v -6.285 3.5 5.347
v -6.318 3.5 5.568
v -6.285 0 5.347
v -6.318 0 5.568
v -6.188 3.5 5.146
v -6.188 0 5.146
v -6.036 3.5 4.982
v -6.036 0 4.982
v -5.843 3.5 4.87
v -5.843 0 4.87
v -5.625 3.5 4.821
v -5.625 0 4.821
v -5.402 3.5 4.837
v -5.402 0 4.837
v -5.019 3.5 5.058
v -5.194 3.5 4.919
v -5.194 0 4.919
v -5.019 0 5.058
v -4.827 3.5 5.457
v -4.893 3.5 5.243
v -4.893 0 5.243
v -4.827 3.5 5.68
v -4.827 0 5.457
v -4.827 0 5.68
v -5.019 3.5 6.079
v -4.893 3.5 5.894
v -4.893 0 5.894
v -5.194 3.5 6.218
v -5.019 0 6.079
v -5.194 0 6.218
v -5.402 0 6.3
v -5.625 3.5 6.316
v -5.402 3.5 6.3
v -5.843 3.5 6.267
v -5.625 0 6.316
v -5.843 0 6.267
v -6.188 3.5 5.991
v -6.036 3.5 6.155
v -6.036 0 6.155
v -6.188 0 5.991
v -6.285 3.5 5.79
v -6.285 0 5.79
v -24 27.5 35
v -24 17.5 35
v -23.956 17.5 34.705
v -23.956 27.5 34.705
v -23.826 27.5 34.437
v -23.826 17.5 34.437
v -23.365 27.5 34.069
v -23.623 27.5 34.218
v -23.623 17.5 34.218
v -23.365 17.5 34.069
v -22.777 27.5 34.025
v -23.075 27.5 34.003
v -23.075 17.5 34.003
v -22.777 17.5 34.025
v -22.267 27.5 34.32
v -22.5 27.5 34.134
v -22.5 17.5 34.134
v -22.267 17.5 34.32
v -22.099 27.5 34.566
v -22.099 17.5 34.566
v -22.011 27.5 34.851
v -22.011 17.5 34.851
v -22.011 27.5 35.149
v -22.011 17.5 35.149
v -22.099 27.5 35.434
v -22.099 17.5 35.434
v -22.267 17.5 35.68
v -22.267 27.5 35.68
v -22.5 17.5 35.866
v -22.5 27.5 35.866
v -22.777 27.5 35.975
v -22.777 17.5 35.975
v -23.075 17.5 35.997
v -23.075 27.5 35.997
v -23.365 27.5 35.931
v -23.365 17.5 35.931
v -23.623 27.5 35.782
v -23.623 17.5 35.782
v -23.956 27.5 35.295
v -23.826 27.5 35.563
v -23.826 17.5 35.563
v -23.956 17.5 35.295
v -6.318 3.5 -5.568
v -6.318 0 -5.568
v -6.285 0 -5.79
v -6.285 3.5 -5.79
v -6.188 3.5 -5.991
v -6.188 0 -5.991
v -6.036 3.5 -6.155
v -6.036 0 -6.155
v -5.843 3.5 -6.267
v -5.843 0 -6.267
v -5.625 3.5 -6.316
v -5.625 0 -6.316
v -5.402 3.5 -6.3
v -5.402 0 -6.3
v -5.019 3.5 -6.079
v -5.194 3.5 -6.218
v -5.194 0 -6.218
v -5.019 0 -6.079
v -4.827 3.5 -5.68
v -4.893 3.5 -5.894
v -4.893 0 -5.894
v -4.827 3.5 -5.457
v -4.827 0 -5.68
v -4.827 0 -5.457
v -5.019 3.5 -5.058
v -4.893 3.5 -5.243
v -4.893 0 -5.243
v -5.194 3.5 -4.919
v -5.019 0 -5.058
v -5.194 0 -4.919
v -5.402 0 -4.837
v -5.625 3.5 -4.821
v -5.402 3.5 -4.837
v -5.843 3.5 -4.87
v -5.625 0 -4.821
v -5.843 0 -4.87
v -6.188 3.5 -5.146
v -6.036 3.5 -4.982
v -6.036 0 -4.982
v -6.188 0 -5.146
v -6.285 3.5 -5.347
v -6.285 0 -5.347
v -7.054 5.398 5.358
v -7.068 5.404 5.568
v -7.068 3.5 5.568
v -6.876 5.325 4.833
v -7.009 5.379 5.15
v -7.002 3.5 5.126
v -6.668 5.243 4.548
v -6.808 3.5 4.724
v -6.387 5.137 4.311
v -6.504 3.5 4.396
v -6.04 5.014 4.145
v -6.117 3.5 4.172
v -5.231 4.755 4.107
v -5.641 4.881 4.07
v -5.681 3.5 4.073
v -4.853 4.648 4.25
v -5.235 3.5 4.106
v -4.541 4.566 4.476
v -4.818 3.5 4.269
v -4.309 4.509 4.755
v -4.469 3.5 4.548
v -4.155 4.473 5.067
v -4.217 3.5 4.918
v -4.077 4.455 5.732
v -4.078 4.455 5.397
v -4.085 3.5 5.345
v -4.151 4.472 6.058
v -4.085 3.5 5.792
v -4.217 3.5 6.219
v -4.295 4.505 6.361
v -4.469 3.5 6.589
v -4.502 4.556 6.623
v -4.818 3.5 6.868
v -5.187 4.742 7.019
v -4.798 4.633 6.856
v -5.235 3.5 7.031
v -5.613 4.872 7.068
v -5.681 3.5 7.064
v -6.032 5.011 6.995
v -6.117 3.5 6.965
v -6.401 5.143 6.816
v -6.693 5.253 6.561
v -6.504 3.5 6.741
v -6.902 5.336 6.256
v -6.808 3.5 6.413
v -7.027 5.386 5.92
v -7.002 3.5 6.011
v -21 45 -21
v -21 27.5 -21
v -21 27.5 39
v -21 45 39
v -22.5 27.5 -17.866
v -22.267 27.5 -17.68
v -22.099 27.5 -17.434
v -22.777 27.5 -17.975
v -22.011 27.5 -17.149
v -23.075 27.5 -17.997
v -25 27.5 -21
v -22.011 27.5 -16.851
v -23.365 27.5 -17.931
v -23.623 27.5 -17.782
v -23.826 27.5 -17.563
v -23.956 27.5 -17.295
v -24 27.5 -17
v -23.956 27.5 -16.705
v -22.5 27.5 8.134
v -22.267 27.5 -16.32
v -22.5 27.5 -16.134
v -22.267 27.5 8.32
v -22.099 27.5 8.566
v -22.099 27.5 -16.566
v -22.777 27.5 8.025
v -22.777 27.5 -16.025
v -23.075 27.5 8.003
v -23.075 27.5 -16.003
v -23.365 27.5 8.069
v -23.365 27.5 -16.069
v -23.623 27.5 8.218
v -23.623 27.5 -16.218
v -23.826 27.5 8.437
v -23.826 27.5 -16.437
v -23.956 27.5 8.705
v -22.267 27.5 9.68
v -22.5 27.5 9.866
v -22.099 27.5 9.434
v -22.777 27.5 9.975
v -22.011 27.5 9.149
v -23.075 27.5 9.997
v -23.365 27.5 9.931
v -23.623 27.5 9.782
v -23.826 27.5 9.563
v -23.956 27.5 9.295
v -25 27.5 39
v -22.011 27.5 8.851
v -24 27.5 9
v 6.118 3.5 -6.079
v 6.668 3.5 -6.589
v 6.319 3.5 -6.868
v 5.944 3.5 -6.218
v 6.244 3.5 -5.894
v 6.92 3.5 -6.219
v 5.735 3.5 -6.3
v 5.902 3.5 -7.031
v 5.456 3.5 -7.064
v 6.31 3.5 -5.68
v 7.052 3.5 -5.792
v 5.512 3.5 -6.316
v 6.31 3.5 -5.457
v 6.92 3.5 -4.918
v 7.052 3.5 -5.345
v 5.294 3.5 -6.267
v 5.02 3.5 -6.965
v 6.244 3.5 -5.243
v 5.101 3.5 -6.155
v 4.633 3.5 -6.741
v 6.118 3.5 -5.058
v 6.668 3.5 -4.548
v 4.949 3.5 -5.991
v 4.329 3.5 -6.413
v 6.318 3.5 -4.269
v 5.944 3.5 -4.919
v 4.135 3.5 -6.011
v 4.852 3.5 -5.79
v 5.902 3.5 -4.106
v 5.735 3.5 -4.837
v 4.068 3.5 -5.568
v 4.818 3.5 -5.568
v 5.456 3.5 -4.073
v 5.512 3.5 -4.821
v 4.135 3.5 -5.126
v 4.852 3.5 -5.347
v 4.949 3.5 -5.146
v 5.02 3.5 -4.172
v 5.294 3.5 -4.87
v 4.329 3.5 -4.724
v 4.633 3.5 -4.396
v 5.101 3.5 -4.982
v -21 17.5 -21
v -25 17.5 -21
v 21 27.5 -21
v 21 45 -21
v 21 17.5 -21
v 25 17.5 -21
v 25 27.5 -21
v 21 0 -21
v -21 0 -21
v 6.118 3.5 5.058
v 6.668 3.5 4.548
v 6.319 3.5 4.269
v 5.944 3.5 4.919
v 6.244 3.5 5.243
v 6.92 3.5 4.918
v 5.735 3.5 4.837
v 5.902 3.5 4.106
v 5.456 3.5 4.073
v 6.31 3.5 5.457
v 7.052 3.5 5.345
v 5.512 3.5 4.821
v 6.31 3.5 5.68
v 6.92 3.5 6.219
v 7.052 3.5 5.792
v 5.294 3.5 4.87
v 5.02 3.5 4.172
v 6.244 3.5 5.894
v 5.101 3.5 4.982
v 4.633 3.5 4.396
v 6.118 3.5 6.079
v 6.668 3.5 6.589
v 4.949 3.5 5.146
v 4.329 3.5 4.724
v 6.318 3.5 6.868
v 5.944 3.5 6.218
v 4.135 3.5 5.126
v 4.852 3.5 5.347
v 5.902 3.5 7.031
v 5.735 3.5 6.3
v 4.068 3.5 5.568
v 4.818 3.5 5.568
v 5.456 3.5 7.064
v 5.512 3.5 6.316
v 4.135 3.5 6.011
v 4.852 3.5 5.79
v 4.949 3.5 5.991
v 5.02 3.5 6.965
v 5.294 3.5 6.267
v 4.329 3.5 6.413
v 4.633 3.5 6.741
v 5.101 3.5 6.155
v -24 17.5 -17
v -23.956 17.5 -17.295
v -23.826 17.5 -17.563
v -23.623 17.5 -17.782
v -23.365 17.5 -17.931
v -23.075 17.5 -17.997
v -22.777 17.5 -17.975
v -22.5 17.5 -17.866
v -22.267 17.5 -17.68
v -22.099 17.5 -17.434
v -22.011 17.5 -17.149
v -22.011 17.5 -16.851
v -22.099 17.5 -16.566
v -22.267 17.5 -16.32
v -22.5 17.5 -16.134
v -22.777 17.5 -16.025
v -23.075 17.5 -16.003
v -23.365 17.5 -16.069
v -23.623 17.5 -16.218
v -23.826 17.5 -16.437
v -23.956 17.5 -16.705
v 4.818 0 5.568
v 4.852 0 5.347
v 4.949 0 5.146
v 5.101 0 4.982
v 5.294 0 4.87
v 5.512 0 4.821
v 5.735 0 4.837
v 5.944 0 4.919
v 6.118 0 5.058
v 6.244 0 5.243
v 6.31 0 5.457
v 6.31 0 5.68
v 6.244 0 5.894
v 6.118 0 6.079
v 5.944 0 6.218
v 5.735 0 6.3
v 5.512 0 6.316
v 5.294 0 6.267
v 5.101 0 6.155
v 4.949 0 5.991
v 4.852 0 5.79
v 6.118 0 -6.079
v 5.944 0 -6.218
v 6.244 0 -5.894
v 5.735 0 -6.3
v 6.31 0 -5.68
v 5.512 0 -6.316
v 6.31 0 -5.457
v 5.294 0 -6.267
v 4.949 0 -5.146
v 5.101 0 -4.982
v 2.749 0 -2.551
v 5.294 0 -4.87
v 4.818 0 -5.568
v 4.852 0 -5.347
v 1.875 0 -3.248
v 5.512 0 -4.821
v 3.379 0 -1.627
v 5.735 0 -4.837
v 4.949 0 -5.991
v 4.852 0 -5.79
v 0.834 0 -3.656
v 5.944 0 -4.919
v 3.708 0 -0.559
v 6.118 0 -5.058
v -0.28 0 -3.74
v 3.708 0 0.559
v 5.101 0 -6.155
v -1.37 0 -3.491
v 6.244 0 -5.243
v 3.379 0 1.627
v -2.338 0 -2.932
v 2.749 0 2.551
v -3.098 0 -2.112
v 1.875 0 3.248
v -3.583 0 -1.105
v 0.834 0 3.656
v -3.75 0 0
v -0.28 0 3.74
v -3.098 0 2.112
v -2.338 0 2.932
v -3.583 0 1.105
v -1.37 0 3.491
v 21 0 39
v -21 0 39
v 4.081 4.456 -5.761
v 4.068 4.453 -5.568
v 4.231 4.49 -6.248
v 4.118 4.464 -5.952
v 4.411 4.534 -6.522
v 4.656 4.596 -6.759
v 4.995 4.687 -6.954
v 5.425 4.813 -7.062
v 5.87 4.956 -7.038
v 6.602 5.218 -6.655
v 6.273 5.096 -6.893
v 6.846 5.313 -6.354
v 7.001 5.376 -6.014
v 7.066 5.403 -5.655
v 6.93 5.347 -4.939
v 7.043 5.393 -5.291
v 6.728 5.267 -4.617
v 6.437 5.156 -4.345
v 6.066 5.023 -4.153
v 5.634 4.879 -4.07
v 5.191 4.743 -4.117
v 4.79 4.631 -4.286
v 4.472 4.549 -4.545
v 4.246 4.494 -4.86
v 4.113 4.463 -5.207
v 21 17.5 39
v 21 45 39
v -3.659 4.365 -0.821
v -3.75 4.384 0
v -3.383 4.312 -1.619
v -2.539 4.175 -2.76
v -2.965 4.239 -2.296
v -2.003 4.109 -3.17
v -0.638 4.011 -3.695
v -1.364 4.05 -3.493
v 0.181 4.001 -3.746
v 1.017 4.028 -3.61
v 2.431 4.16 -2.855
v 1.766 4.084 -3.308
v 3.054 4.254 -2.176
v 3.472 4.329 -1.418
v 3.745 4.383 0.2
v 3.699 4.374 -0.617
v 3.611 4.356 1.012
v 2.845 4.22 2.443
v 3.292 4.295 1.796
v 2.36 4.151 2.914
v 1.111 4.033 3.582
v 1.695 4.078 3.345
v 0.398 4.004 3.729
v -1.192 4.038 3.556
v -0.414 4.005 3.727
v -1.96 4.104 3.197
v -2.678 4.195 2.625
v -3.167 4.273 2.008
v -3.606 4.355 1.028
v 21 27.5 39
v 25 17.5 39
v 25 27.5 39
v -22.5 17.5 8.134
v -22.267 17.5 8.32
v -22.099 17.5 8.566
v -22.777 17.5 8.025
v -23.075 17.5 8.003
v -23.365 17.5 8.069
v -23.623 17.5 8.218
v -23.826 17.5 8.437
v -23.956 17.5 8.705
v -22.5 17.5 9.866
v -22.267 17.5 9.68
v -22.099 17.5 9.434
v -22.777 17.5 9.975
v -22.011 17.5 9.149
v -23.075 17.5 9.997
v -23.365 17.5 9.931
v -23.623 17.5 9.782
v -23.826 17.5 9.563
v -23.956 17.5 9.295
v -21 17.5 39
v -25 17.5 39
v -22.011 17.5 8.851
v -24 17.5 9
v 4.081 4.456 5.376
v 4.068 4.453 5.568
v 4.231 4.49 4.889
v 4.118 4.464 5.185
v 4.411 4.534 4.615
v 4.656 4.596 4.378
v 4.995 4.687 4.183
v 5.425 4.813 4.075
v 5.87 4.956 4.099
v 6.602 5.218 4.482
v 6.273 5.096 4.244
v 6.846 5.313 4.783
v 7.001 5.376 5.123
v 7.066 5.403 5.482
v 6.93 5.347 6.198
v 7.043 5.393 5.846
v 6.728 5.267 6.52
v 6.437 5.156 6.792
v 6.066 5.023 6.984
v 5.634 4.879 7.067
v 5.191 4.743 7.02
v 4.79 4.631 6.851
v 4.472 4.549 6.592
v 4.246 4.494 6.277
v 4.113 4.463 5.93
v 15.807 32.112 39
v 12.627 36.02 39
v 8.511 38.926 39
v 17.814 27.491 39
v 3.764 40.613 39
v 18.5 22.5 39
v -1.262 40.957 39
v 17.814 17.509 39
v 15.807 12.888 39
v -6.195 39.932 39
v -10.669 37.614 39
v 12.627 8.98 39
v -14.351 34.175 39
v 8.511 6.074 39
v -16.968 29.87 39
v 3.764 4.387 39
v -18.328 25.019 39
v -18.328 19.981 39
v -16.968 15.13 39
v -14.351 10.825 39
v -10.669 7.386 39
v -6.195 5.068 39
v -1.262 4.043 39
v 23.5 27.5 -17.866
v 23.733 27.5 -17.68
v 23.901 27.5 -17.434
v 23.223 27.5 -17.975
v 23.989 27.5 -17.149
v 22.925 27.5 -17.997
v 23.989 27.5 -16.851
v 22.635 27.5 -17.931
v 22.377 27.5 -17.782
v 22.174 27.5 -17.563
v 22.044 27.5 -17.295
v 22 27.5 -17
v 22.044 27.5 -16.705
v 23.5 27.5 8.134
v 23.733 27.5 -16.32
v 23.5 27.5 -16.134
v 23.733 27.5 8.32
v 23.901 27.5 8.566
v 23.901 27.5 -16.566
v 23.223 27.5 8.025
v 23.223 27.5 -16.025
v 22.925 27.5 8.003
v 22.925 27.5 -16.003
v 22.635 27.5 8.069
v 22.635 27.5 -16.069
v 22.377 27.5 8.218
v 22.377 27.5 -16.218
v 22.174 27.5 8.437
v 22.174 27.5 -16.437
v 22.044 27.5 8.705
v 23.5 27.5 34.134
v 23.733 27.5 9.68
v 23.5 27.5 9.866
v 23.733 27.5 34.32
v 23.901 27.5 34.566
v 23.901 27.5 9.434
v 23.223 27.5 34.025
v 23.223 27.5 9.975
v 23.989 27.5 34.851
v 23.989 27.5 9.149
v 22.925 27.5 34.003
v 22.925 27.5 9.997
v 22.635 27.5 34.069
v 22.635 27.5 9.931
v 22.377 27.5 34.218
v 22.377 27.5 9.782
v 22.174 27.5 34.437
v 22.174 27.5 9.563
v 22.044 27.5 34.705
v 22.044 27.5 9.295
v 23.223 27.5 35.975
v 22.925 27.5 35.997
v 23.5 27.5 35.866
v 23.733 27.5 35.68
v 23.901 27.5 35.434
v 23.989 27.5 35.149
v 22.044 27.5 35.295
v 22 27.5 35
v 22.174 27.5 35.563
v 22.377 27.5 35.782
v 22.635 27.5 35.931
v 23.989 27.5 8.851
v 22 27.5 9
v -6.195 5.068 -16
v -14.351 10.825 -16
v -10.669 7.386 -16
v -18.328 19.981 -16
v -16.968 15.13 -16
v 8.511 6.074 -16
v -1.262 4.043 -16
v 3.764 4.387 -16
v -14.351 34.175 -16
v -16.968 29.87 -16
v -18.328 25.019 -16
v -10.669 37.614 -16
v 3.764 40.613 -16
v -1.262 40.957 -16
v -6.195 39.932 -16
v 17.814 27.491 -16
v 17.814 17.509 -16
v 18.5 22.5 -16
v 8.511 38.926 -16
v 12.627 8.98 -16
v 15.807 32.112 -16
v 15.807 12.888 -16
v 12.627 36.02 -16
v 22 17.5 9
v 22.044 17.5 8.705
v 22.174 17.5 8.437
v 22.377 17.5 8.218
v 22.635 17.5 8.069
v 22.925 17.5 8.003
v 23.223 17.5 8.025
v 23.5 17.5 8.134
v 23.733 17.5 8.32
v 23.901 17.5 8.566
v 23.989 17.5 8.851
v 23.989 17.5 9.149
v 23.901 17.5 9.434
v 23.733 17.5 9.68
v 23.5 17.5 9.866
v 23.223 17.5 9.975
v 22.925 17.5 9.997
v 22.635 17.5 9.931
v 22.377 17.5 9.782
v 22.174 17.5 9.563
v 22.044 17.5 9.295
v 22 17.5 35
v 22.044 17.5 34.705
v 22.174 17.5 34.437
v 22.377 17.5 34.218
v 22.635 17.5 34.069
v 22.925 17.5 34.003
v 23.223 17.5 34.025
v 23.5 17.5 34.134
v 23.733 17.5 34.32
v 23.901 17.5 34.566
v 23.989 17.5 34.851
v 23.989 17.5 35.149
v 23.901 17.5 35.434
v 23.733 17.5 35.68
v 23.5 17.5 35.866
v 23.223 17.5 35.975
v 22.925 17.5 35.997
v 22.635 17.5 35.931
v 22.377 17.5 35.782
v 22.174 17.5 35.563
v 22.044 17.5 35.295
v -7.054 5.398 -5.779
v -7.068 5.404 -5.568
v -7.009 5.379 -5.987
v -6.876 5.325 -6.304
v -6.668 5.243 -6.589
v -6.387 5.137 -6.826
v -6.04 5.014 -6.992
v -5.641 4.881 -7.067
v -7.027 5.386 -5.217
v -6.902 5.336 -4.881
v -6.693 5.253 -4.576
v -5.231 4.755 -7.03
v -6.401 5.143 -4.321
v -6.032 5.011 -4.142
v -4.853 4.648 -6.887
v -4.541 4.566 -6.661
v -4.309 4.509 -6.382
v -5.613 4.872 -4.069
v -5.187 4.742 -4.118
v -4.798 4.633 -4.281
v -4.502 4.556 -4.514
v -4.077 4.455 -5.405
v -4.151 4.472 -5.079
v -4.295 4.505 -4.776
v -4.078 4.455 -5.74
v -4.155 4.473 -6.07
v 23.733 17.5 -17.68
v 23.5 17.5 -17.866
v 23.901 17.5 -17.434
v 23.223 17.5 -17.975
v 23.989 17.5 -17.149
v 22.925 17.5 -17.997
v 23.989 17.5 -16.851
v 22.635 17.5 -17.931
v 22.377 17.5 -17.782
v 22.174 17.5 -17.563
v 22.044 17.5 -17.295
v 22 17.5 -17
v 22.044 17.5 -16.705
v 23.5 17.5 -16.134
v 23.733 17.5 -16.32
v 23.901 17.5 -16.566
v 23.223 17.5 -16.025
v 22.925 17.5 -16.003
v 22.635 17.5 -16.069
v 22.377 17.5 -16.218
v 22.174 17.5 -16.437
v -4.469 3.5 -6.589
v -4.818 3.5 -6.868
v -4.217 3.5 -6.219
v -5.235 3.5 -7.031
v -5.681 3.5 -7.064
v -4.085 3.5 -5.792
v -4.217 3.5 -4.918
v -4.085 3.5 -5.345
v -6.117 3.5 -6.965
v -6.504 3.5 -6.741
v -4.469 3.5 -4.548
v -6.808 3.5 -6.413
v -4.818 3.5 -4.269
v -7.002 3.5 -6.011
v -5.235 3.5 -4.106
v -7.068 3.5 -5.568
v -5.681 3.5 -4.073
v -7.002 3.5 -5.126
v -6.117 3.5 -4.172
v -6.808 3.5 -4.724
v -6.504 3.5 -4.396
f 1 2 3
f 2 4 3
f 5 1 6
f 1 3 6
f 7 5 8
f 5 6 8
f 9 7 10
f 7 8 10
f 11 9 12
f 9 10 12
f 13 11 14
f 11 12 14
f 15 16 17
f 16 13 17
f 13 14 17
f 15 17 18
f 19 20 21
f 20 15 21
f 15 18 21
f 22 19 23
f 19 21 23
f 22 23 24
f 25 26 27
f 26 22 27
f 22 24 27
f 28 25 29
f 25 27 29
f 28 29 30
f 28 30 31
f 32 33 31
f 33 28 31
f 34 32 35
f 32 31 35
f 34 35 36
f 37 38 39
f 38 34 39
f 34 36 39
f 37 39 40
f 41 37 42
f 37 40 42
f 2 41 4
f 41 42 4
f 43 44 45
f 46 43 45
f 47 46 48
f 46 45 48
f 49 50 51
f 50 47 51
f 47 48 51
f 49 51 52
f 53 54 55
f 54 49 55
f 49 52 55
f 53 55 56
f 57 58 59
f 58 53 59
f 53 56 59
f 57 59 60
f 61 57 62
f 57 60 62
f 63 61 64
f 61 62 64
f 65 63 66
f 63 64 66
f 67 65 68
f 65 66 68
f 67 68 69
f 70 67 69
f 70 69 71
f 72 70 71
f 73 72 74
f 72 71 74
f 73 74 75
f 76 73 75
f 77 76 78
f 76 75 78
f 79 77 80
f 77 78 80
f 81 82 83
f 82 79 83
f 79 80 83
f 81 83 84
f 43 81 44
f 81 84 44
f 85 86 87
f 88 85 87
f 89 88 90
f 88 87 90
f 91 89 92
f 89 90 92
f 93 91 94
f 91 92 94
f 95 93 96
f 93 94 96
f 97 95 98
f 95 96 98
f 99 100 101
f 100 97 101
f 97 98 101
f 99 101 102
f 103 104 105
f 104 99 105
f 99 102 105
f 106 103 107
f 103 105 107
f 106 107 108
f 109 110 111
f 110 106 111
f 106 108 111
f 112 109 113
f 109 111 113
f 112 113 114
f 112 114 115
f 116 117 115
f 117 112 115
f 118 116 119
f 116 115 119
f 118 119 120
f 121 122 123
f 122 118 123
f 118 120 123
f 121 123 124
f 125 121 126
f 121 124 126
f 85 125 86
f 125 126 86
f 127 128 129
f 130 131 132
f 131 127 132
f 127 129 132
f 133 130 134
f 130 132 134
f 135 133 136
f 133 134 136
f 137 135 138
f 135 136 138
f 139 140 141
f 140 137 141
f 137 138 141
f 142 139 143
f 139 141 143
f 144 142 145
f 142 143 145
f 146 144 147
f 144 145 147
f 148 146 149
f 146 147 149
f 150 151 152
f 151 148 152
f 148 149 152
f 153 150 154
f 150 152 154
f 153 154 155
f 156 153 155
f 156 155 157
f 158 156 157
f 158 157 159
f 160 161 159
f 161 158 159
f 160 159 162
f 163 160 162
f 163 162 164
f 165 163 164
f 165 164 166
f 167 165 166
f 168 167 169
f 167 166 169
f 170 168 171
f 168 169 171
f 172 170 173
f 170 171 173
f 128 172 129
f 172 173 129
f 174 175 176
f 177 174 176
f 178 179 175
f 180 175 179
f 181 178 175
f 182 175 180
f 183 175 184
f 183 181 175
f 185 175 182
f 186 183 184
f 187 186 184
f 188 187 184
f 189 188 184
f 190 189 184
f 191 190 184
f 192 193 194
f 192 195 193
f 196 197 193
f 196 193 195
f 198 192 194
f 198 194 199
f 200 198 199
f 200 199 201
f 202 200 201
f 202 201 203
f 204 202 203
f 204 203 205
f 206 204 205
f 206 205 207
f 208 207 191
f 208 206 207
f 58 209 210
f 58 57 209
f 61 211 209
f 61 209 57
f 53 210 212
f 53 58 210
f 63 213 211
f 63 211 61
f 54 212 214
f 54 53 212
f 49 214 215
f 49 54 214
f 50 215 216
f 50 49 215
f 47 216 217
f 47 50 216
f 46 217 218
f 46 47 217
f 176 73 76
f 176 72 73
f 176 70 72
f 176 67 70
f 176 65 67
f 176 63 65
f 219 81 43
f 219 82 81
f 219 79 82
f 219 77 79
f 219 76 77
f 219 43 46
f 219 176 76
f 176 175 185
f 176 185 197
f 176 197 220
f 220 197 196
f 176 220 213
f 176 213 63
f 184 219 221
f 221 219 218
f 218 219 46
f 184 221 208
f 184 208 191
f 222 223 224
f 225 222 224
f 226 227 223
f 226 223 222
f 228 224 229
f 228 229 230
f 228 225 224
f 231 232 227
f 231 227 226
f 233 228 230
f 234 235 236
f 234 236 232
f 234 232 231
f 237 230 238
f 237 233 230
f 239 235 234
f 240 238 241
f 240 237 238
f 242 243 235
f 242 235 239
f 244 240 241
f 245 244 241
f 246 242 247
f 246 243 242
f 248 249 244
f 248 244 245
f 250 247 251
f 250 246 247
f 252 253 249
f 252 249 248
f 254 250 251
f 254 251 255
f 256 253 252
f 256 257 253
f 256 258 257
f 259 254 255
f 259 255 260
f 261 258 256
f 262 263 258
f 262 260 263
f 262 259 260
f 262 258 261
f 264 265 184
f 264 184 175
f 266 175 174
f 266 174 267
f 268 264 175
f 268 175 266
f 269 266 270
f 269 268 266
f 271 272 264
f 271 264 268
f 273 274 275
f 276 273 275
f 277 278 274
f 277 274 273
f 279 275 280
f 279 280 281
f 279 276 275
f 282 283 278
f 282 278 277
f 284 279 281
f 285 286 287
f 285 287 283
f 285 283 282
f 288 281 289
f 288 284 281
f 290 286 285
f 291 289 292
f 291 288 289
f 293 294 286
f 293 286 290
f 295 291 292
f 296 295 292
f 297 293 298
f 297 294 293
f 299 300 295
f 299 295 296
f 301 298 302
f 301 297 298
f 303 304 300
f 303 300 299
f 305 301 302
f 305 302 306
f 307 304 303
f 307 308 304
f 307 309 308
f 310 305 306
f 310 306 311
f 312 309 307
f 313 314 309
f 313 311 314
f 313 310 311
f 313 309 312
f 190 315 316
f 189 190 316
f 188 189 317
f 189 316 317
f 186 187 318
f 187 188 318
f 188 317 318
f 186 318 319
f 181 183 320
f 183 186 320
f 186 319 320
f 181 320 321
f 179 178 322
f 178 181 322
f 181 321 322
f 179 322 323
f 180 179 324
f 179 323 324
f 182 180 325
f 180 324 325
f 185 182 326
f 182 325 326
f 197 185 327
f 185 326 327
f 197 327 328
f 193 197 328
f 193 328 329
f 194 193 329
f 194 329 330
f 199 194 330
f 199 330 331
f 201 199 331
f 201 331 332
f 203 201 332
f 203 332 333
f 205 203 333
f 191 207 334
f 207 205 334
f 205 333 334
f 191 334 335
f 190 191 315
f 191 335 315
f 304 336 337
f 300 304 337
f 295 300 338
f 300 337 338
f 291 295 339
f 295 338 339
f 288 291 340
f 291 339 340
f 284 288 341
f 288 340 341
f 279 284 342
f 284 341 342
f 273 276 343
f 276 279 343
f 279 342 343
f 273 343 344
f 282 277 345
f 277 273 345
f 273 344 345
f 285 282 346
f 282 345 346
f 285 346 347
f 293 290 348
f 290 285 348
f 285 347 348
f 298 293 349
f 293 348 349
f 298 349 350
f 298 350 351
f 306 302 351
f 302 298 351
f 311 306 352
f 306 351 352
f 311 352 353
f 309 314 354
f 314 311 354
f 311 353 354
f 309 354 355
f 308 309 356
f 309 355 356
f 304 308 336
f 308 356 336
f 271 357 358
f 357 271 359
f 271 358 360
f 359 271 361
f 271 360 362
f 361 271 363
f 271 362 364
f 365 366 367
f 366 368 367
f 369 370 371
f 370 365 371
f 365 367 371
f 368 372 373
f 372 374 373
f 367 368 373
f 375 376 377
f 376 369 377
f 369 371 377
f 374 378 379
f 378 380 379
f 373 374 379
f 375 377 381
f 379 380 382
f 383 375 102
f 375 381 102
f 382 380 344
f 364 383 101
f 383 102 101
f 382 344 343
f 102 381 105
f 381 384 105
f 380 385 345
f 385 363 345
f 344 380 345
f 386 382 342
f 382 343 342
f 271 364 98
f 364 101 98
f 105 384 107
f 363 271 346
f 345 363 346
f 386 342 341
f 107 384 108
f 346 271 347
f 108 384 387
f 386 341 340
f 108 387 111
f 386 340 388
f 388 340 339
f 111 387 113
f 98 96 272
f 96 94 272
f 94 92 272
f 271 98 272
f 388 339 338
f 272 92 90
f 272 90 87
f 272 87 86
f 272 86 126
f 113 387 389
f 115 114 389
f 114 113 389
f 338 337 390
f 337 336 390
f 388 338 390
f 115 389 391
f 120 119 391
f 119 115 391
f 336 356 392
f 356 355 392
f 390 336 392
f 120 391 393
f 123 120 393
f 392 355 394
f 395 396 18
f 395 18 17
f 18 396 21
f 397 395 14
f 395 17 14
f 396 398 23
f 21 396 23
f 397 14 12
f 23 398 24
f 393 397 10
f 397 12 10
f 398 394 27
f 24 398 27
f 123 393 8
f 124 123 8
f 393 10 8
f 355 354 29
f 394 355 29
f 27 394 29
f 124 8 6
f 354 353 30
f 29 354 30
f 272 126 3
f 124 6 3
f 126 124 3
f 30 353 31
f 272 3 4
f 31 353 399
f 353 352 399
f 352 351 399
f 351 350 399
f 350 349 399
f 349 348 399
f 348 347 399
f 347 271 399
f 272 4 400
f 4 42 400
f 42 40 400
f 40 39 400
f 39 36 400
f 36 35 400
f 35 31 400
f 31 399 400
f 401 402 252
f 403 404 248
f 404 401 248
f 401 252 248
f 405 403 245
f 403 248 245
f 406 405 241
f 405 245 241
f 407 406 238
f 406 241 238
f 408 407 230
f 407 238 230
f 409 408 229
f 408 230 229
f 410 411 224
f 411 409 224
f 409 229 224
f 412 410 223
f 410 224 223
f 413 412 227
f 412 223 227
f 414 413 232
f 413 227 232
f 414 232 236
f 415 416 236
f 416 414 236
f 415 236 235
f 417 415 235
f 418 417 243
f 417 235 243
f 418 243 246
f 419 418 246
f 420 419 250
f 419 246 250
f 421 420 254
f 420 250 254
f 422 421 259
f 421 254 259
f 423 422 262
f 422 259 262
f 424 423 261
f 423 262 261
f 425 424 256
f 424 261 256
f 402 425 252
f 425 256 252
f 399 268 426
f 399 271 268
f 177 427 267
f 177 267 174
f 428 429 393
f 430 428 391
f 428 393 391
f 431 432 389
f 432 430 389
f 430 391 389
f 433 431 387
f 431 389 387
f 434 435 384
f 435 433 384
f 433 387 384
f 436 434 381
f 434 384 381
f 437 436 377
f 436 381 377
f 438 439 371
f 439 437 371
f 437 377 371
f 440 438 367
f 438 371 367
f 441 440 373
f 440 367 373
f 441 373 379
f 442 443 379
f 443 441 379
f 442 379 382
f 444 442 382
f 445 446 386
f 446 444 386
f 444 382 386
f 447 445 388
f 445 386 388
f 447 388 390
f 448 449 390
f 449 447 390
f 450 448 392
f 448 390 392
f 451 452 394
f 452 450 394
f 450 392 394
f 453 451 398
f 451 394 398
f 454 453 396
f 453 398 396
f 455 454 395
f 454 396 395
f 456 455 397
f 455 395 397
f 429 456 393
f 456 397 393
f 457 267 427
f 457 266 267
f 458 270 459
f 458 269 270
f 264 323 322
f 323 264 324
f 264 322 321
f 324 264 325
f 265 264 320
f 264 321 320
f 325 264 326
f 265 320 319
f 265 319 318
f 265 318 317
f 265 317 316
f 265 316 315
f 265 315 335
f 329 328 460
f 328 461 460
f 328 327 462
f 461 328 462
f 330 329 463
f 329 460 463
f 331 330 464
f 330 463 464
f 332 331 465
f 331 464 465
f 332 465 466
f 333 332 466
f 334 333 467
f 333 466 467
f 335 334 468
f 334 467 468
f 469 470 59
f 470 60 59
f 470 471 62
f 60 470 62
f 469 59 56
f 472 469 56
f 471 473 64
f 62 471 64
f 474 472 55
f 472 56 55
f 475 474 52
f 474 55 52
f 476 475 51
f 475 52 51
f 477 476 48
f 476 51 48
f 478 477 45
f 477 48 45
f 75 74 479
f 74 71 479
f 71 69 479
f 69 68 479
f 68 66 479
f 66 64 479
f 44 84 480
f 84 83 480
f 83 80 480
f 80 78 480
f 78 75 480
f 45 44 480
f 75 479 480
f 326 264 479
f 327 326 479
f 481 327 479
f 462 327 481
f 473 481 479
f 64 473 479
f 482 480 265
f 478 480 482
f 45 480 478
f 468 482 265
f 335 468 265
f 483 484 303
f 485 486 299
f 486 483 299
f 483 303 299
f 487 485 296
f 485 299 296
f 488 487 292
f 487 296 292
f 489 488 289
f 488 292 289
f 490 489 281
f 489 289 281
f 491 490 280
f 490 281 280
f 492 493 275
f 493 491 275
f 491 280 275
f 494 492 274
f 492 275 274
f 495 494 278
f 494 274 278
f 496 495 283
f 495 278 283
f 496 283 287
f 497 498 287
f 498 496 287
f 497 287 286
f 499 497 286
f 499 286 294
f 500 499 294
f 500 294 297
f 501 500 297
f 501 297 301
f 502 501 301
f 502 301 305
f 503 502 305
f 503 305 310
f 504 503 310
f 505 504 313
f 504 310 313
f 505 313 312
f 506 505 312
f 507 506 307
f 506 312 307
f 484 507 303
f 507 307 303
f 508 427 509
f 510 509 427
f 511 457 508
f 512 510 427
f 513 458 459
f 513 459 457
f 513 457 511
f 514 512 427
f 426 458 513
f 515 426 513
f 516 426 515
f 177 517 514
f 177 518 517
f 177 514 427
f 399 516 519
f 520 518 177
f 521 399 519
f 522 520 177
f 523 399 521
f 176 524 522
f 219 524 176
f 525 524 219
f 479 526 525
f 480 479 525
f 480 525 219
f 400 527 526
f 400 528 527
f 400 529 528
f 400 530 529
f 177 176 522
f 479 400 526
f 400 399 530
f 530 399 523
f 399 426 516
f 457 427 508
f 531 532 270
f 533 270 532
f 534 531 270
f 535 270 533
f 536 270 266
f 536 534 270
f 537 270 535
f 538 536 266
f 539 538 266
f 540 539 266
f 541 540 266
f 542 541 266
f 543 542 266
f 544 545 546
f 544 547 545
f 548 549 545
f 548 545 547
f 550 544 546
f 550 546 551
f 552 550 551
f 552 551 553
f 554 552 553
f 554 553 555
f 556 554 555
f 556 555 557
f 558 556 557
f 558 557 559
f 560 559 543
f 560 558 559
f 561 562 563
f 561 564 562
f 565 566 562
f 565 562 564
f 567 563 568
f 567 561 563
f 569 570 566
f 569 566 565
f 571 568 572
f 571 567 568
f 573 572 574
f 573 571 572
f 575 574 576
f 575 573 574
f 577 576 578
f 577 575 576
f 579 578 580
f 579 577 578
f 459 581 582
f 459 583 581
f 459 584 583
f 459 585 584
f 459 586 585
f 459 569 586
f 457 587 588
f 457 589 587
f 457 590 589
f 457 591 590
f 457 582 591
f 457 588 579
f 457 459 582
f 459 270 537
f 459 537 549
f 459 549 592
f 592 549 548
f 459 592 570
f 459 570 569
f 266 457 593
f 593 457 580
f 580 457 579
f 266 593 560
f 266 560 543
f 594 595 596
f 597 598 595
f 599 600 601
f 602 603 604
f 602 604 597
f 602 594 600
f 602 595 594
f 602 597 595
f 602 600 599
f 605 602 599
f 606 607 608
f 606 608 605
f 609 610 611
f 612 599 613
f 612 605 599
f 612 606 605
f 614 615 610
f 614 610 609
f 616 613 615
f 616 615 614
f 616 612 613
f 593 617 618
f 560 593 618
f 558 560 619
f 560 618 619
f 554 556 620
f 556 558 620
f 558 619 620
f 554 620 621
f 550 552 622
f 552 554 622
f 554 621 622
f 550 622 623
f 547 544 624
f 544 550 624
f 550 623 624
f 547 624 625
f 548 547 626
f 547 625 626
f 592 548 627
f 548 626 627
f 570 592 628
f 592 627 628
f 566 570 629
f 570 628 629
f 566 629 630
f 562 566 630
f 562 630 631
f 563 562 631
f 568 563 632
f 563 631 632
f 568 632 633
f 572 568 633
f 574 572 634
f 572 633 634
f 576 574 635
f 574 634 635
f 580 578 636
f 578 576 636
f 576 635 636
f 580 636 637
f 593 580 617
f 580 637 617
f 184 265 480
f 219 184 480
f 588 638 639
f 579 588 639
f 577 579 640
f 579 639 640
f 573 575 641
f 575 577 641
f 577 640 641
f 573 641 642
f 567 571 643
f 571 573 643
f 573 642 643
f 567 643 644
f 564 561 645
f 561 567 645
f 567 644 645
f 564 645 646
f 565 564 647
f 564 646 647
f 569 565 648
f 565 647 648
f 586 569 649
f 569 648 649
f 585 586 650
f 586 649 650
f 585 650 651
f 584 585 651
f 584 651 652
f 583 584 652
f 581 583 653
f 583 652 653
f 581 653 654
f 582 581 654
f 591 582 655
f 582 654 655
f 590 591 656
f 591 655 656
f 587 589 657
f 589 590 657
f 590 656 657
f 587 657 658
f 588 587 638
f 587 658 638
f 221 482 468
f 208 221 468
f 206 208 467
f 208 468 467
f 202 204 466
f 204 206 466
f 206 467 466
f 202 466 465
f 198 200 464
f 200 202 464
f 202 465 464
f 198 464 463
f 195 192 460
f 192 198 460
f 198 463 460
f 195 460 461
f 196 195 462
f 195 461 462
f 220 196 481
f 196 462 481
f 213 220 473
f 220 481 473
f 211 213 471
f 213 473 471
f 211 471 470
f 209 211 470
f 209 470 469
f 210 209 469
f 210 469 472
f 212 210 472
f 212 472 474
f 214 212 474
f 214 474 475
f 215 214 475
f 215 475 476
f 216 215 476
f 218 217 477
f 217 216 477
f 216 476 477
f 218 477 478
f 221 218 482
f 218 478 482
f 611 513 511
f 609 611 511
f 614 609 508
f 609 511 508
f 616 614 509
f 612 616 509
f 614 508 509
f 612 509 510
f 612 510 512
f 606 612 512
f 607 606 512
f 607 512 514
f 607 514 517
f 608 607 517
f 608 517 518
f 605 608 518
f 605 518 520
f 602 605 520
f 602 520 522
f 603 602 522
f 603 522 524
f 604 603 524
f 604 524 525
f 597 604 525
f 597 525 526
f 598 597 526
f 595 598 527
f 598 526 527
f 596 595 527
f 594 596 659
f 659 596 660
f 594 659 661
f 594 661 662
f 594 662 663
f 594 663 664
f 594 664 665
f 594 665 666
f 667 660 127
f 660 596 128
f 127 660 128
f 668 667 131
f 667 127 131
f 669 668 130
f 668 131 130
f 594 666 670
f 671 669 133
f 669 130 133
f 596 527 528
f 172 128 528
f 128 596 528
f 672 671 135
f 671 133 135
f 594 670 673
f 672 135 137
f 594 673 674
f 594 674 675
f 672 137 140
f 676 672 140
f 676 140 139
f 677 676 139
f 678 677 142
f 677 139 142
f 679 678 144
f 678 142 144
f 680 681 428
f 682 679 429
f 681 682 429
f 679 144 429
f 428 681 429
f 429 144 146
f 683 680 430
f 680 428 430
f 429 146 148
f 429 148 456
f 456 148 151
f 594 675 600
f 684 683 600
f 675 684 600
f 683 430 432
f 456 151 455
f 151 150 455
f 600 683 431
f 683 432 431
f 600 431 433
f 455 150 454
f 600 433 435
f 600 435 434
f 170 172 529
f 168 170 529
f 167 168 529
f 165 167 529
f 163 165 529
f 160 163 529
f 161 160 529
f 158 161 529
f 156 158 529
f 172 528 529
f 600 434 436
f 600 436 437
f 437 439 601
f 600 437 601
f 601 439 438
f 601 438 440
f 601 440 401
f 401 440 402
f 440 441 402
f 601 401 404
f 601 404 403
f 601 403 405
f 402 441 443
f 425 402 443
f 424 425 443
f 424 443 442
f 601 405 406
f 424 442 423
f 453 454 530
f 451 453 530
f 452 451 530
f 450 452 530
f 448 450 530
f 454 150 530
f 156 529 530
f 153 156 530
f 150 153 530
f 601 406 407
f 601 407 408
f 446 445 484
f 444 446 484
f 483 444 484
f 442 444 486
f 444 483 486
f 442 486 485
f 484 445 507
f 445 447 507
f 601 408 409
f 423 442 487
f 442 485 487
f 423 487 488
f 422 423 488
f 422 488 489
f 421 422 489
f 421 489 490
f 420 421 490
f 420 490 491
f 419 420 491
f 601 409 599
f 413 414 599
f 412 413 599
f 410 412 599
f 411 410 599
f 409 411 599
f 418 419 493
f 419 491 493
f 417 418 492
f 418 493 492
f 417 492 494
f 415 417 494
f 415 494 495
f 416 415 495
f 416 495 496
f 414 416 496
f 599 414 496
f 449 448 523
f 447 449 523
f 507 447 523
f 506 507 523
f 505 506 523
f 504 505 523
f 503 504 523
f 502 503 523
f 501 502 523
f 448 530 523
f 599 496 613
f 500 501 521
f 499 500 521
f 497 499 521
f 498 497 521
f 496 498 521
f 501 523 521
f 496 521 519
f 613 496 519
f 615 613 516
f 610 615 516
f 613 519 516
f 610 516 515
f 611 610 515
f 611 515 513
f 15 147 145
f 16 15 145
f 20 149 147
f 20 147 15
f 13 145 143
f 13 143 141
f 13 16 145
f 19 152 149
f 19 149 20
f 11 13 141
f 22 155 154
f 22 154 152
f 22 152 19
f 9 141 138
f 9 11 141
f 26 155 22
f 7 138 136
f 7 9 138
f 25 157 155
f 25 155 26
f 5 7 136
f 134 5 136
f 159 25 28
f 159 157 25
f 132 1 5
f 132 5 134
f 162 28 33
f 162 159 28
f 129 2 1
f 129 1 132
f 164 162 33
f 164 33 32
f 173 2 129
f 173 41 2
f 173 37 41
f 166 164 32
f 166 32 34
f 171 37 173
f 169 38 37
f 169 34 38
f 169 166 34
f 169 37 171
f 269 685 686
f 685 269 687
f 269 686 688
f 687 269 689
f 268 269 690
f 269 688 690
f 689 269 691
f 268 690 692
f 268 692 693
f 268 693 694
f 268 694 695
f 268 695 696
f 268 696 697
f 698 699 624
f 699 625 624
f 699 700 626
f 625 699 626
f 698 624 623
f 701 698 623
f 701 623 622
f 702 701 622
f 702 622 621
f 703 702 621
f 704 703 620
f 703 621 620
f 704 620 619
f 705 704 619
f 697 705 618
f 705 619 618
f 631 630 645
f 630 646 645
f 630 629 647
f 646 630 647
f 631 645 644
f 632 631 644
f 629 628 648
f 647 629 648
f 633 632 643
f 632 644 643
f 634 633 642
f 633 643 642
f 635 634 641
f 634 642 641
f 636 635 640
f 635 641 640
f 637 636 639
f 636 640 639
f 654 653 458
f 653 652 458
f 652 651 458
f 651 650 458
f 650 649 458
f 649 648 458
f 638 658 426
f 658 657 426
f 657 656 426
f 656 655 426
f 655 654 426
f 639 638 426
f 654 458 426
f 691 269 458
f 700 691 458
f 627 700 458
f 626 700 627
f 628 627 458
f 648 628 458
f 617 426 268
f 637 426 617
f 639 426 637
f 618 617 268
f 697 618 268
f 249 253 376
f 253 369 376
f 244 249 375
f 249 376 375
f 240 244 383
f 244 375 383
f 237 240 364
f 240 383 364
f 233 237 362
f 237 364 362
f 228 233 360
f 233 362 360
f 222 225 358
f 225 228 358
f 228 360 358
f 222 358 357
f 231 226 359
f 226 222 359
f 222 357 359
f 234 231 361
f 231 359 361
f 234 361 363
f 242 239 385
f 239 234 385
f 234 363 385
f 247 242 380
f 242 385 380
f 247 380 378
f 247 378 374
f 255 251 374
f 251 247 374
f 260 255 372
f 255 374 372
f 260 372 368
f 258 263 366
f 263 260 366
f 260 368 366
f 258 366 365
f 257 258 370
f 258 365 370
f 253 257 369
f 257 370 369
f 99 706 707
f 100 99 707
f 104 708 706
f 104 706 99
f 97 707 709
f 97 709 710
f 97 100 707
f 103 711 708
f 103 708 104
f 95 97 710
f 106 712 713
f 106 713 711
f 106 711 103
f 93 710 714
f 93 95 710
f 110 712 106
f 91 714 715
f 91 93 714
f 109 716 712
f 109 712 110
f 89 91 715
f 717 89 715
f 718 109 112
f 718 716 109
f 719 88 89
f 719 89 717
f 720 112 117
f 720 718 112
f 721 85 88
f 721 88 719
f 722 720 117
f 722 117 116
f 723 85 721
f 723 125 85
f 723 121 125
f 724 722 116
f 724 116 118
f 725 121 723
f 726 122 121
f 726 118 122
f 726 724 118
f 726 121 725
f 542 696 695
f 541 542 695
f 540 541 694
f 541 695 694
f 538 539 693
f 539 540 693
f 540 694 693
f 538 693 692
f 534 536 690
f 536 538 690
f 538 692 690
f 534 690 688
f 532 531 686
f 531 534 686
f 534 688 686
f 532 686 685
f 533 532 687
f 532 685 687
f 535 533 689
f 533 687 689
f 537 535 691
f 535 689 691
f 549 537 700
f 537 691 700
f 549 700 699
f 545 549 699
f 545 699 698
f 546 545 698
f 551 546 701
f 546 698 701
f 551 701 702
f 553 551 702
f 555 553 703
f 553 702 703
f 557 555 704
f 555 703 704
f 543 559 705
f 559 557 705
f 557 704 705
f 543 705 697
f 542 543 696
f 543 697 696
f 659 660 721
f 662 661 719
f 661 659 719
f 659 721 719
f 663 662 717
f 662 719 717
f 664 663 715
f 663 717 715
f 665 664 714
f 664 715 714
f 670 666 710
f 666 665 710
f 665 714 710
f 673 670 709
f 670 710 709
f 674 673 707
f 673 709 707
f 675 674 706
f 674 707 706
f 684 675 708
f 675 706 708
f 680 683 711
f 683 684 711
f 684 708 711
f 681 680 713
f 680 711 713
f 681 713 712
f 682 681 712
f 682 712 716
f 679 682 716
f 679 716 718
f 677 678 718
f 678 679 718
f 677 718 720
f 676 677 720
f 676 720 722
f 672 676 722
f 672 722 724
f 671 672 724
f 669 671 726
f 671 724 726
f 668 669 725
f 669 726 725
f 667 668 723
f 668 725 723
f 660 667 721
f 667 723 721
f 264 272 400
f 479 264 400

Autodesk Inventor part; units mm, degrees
ref_plane "YZ Plane" through (0, 0, 0) normal (1, 0, 0) x (0, 1, 0)
ref_plane "XZ Plane" through (0, 0, 0) normal (0, 1, 0) x (-1, 0, 0)
ref_plane "XY Plane" through (0, 0, 0) normal (0, 0, 1) x (1, 0, 0)
sketch "Sketch1" plane through (0, 0, 0) normal (0, 1, 0) x (-1, 0, 0)
  circle A0 centre (0, 0) radius 11 construction
  circle A1 centre (0, 0) radius 3.75
  circle A2 centre (0, 0) radius 7.875 construction
  line L0 (16.292, 0) -> (-19, 0) construction
  line L1 (0, 21) -> (0, -27.3544) construction
  line L2 (0, -21) -> (21, -21)
  line L3 (0, -21) -> (-21, -21)
  line L4 (0, 0) -> (21, -21) construction
  circle A3 centre (5.5685, -5.5685) radius 0.75
  circle A4 centre (-5.5685, -5.5685) radius 0.75
  circle A5 centre (5.5685, 5.5685) radius 0.75
  circle A6 centre (-5.5685, 5.5685) radius 0.75
  line L5 (-25, -21) -> (-21, -21)
  line L6 (25, -21) -> (21, -21)
  circle A7 centre (23, -17) radius 1
  circle A8 centre (-23, -17) radius 1
  line L7 (-25, 39) -> (25, 39)
  line L8 (25, -21) -> (25, 39)
  line L9 (21, -21) -> (21, 39)
  line L10 (-21, -21) -> (-21, 39)
  line L11 (-25, -21) -> (-25, 39)
  line L12 (25, 9) -> (-25, 9) construction
  circle A9 centre (23, 35) radius 1
  circle A10 centre (-23, 35) radius 1
  circle A11 centre (23, 9) radius 1
  circle A12 centre (-23, 9) radius 1
  circle A13 centre (5.5685, 5.5685) radius 1.5
  circle A14 centre (5.5685, -5.5685) radius 1.5
  circle A15 centre (-5.5685, 5.5685) radius 1.5
  circle A16 centre (-5.5685, -5.5685) radius 1.5
  dimension "d8" = 15.75
  dimension "d2" = 7.5
  dimension "d4" = 22
  dimension "d17" = 21
  dimension "d26" = 1.5
  dimension "d38" = 60
  dimension "d39" = 21
  dimension "d40" = 2
  dimension "d41" = 2
  dimension "d53" = 3
extrude "Extrusion9" add sketch "Sketch1" along normal blind 45 contours A1 | L3 L10 L7 L9 L2 | A3 | A4 | A5 | A6 | A13 | A14 | A15 | A16
extrude "Extrusion10" add sketch "Sketch1" along normal blind 27.5 contours L9 L7 L8 L6 | L5 L11 L7 L10
extrude "Extrusion11" cut sketch "Sketch1" along normal blind 17.5 contours L9 L7 L8 L6 | L5 L11 L7 L10
extrude "Extrusion13" cut sketch "Sketch1" along normal blind 6 contours A1 | A3 | A4 | A5 | A6 | A13 | A14 | A15 | A16
extrude "Extrusion15" add sketch "Sketch1" along normal blind 3.5 contours A13 | A14 | A15 | A16
sketch "Sketch5" plane through (-21, 45, 39) normal (0, 0, 1) x (1, 0, 0)
  line L0 (0, -45) -> (42, -45) construction
  line L1 (0, -17.5) -> (0, 0) construction
  line L2 (42, -45) -> (0, -45) construction
  line L3 (0, -45) -> (0, 0) construction
  line L4 (0, 0) -> (42, 0) construction
  line L5 (42, 0) -> (42, -45) construction
  line L6 (42, 0) -> (0, -45) construction
  line L7 (0, 0) -> (42, 0) construction
  line L8 (0, 0) -> (42, -45) construction
  circle A0 centre (21, -22.5) radius 18.5
  point P0 (21, -45)
  dimension "d58" = 37
extrude "Extrusion16" cut sketch "Sketch5" against normal blind 55
equation "\"d41\" = d40"
properties part number "engine_connector_sleeve"
